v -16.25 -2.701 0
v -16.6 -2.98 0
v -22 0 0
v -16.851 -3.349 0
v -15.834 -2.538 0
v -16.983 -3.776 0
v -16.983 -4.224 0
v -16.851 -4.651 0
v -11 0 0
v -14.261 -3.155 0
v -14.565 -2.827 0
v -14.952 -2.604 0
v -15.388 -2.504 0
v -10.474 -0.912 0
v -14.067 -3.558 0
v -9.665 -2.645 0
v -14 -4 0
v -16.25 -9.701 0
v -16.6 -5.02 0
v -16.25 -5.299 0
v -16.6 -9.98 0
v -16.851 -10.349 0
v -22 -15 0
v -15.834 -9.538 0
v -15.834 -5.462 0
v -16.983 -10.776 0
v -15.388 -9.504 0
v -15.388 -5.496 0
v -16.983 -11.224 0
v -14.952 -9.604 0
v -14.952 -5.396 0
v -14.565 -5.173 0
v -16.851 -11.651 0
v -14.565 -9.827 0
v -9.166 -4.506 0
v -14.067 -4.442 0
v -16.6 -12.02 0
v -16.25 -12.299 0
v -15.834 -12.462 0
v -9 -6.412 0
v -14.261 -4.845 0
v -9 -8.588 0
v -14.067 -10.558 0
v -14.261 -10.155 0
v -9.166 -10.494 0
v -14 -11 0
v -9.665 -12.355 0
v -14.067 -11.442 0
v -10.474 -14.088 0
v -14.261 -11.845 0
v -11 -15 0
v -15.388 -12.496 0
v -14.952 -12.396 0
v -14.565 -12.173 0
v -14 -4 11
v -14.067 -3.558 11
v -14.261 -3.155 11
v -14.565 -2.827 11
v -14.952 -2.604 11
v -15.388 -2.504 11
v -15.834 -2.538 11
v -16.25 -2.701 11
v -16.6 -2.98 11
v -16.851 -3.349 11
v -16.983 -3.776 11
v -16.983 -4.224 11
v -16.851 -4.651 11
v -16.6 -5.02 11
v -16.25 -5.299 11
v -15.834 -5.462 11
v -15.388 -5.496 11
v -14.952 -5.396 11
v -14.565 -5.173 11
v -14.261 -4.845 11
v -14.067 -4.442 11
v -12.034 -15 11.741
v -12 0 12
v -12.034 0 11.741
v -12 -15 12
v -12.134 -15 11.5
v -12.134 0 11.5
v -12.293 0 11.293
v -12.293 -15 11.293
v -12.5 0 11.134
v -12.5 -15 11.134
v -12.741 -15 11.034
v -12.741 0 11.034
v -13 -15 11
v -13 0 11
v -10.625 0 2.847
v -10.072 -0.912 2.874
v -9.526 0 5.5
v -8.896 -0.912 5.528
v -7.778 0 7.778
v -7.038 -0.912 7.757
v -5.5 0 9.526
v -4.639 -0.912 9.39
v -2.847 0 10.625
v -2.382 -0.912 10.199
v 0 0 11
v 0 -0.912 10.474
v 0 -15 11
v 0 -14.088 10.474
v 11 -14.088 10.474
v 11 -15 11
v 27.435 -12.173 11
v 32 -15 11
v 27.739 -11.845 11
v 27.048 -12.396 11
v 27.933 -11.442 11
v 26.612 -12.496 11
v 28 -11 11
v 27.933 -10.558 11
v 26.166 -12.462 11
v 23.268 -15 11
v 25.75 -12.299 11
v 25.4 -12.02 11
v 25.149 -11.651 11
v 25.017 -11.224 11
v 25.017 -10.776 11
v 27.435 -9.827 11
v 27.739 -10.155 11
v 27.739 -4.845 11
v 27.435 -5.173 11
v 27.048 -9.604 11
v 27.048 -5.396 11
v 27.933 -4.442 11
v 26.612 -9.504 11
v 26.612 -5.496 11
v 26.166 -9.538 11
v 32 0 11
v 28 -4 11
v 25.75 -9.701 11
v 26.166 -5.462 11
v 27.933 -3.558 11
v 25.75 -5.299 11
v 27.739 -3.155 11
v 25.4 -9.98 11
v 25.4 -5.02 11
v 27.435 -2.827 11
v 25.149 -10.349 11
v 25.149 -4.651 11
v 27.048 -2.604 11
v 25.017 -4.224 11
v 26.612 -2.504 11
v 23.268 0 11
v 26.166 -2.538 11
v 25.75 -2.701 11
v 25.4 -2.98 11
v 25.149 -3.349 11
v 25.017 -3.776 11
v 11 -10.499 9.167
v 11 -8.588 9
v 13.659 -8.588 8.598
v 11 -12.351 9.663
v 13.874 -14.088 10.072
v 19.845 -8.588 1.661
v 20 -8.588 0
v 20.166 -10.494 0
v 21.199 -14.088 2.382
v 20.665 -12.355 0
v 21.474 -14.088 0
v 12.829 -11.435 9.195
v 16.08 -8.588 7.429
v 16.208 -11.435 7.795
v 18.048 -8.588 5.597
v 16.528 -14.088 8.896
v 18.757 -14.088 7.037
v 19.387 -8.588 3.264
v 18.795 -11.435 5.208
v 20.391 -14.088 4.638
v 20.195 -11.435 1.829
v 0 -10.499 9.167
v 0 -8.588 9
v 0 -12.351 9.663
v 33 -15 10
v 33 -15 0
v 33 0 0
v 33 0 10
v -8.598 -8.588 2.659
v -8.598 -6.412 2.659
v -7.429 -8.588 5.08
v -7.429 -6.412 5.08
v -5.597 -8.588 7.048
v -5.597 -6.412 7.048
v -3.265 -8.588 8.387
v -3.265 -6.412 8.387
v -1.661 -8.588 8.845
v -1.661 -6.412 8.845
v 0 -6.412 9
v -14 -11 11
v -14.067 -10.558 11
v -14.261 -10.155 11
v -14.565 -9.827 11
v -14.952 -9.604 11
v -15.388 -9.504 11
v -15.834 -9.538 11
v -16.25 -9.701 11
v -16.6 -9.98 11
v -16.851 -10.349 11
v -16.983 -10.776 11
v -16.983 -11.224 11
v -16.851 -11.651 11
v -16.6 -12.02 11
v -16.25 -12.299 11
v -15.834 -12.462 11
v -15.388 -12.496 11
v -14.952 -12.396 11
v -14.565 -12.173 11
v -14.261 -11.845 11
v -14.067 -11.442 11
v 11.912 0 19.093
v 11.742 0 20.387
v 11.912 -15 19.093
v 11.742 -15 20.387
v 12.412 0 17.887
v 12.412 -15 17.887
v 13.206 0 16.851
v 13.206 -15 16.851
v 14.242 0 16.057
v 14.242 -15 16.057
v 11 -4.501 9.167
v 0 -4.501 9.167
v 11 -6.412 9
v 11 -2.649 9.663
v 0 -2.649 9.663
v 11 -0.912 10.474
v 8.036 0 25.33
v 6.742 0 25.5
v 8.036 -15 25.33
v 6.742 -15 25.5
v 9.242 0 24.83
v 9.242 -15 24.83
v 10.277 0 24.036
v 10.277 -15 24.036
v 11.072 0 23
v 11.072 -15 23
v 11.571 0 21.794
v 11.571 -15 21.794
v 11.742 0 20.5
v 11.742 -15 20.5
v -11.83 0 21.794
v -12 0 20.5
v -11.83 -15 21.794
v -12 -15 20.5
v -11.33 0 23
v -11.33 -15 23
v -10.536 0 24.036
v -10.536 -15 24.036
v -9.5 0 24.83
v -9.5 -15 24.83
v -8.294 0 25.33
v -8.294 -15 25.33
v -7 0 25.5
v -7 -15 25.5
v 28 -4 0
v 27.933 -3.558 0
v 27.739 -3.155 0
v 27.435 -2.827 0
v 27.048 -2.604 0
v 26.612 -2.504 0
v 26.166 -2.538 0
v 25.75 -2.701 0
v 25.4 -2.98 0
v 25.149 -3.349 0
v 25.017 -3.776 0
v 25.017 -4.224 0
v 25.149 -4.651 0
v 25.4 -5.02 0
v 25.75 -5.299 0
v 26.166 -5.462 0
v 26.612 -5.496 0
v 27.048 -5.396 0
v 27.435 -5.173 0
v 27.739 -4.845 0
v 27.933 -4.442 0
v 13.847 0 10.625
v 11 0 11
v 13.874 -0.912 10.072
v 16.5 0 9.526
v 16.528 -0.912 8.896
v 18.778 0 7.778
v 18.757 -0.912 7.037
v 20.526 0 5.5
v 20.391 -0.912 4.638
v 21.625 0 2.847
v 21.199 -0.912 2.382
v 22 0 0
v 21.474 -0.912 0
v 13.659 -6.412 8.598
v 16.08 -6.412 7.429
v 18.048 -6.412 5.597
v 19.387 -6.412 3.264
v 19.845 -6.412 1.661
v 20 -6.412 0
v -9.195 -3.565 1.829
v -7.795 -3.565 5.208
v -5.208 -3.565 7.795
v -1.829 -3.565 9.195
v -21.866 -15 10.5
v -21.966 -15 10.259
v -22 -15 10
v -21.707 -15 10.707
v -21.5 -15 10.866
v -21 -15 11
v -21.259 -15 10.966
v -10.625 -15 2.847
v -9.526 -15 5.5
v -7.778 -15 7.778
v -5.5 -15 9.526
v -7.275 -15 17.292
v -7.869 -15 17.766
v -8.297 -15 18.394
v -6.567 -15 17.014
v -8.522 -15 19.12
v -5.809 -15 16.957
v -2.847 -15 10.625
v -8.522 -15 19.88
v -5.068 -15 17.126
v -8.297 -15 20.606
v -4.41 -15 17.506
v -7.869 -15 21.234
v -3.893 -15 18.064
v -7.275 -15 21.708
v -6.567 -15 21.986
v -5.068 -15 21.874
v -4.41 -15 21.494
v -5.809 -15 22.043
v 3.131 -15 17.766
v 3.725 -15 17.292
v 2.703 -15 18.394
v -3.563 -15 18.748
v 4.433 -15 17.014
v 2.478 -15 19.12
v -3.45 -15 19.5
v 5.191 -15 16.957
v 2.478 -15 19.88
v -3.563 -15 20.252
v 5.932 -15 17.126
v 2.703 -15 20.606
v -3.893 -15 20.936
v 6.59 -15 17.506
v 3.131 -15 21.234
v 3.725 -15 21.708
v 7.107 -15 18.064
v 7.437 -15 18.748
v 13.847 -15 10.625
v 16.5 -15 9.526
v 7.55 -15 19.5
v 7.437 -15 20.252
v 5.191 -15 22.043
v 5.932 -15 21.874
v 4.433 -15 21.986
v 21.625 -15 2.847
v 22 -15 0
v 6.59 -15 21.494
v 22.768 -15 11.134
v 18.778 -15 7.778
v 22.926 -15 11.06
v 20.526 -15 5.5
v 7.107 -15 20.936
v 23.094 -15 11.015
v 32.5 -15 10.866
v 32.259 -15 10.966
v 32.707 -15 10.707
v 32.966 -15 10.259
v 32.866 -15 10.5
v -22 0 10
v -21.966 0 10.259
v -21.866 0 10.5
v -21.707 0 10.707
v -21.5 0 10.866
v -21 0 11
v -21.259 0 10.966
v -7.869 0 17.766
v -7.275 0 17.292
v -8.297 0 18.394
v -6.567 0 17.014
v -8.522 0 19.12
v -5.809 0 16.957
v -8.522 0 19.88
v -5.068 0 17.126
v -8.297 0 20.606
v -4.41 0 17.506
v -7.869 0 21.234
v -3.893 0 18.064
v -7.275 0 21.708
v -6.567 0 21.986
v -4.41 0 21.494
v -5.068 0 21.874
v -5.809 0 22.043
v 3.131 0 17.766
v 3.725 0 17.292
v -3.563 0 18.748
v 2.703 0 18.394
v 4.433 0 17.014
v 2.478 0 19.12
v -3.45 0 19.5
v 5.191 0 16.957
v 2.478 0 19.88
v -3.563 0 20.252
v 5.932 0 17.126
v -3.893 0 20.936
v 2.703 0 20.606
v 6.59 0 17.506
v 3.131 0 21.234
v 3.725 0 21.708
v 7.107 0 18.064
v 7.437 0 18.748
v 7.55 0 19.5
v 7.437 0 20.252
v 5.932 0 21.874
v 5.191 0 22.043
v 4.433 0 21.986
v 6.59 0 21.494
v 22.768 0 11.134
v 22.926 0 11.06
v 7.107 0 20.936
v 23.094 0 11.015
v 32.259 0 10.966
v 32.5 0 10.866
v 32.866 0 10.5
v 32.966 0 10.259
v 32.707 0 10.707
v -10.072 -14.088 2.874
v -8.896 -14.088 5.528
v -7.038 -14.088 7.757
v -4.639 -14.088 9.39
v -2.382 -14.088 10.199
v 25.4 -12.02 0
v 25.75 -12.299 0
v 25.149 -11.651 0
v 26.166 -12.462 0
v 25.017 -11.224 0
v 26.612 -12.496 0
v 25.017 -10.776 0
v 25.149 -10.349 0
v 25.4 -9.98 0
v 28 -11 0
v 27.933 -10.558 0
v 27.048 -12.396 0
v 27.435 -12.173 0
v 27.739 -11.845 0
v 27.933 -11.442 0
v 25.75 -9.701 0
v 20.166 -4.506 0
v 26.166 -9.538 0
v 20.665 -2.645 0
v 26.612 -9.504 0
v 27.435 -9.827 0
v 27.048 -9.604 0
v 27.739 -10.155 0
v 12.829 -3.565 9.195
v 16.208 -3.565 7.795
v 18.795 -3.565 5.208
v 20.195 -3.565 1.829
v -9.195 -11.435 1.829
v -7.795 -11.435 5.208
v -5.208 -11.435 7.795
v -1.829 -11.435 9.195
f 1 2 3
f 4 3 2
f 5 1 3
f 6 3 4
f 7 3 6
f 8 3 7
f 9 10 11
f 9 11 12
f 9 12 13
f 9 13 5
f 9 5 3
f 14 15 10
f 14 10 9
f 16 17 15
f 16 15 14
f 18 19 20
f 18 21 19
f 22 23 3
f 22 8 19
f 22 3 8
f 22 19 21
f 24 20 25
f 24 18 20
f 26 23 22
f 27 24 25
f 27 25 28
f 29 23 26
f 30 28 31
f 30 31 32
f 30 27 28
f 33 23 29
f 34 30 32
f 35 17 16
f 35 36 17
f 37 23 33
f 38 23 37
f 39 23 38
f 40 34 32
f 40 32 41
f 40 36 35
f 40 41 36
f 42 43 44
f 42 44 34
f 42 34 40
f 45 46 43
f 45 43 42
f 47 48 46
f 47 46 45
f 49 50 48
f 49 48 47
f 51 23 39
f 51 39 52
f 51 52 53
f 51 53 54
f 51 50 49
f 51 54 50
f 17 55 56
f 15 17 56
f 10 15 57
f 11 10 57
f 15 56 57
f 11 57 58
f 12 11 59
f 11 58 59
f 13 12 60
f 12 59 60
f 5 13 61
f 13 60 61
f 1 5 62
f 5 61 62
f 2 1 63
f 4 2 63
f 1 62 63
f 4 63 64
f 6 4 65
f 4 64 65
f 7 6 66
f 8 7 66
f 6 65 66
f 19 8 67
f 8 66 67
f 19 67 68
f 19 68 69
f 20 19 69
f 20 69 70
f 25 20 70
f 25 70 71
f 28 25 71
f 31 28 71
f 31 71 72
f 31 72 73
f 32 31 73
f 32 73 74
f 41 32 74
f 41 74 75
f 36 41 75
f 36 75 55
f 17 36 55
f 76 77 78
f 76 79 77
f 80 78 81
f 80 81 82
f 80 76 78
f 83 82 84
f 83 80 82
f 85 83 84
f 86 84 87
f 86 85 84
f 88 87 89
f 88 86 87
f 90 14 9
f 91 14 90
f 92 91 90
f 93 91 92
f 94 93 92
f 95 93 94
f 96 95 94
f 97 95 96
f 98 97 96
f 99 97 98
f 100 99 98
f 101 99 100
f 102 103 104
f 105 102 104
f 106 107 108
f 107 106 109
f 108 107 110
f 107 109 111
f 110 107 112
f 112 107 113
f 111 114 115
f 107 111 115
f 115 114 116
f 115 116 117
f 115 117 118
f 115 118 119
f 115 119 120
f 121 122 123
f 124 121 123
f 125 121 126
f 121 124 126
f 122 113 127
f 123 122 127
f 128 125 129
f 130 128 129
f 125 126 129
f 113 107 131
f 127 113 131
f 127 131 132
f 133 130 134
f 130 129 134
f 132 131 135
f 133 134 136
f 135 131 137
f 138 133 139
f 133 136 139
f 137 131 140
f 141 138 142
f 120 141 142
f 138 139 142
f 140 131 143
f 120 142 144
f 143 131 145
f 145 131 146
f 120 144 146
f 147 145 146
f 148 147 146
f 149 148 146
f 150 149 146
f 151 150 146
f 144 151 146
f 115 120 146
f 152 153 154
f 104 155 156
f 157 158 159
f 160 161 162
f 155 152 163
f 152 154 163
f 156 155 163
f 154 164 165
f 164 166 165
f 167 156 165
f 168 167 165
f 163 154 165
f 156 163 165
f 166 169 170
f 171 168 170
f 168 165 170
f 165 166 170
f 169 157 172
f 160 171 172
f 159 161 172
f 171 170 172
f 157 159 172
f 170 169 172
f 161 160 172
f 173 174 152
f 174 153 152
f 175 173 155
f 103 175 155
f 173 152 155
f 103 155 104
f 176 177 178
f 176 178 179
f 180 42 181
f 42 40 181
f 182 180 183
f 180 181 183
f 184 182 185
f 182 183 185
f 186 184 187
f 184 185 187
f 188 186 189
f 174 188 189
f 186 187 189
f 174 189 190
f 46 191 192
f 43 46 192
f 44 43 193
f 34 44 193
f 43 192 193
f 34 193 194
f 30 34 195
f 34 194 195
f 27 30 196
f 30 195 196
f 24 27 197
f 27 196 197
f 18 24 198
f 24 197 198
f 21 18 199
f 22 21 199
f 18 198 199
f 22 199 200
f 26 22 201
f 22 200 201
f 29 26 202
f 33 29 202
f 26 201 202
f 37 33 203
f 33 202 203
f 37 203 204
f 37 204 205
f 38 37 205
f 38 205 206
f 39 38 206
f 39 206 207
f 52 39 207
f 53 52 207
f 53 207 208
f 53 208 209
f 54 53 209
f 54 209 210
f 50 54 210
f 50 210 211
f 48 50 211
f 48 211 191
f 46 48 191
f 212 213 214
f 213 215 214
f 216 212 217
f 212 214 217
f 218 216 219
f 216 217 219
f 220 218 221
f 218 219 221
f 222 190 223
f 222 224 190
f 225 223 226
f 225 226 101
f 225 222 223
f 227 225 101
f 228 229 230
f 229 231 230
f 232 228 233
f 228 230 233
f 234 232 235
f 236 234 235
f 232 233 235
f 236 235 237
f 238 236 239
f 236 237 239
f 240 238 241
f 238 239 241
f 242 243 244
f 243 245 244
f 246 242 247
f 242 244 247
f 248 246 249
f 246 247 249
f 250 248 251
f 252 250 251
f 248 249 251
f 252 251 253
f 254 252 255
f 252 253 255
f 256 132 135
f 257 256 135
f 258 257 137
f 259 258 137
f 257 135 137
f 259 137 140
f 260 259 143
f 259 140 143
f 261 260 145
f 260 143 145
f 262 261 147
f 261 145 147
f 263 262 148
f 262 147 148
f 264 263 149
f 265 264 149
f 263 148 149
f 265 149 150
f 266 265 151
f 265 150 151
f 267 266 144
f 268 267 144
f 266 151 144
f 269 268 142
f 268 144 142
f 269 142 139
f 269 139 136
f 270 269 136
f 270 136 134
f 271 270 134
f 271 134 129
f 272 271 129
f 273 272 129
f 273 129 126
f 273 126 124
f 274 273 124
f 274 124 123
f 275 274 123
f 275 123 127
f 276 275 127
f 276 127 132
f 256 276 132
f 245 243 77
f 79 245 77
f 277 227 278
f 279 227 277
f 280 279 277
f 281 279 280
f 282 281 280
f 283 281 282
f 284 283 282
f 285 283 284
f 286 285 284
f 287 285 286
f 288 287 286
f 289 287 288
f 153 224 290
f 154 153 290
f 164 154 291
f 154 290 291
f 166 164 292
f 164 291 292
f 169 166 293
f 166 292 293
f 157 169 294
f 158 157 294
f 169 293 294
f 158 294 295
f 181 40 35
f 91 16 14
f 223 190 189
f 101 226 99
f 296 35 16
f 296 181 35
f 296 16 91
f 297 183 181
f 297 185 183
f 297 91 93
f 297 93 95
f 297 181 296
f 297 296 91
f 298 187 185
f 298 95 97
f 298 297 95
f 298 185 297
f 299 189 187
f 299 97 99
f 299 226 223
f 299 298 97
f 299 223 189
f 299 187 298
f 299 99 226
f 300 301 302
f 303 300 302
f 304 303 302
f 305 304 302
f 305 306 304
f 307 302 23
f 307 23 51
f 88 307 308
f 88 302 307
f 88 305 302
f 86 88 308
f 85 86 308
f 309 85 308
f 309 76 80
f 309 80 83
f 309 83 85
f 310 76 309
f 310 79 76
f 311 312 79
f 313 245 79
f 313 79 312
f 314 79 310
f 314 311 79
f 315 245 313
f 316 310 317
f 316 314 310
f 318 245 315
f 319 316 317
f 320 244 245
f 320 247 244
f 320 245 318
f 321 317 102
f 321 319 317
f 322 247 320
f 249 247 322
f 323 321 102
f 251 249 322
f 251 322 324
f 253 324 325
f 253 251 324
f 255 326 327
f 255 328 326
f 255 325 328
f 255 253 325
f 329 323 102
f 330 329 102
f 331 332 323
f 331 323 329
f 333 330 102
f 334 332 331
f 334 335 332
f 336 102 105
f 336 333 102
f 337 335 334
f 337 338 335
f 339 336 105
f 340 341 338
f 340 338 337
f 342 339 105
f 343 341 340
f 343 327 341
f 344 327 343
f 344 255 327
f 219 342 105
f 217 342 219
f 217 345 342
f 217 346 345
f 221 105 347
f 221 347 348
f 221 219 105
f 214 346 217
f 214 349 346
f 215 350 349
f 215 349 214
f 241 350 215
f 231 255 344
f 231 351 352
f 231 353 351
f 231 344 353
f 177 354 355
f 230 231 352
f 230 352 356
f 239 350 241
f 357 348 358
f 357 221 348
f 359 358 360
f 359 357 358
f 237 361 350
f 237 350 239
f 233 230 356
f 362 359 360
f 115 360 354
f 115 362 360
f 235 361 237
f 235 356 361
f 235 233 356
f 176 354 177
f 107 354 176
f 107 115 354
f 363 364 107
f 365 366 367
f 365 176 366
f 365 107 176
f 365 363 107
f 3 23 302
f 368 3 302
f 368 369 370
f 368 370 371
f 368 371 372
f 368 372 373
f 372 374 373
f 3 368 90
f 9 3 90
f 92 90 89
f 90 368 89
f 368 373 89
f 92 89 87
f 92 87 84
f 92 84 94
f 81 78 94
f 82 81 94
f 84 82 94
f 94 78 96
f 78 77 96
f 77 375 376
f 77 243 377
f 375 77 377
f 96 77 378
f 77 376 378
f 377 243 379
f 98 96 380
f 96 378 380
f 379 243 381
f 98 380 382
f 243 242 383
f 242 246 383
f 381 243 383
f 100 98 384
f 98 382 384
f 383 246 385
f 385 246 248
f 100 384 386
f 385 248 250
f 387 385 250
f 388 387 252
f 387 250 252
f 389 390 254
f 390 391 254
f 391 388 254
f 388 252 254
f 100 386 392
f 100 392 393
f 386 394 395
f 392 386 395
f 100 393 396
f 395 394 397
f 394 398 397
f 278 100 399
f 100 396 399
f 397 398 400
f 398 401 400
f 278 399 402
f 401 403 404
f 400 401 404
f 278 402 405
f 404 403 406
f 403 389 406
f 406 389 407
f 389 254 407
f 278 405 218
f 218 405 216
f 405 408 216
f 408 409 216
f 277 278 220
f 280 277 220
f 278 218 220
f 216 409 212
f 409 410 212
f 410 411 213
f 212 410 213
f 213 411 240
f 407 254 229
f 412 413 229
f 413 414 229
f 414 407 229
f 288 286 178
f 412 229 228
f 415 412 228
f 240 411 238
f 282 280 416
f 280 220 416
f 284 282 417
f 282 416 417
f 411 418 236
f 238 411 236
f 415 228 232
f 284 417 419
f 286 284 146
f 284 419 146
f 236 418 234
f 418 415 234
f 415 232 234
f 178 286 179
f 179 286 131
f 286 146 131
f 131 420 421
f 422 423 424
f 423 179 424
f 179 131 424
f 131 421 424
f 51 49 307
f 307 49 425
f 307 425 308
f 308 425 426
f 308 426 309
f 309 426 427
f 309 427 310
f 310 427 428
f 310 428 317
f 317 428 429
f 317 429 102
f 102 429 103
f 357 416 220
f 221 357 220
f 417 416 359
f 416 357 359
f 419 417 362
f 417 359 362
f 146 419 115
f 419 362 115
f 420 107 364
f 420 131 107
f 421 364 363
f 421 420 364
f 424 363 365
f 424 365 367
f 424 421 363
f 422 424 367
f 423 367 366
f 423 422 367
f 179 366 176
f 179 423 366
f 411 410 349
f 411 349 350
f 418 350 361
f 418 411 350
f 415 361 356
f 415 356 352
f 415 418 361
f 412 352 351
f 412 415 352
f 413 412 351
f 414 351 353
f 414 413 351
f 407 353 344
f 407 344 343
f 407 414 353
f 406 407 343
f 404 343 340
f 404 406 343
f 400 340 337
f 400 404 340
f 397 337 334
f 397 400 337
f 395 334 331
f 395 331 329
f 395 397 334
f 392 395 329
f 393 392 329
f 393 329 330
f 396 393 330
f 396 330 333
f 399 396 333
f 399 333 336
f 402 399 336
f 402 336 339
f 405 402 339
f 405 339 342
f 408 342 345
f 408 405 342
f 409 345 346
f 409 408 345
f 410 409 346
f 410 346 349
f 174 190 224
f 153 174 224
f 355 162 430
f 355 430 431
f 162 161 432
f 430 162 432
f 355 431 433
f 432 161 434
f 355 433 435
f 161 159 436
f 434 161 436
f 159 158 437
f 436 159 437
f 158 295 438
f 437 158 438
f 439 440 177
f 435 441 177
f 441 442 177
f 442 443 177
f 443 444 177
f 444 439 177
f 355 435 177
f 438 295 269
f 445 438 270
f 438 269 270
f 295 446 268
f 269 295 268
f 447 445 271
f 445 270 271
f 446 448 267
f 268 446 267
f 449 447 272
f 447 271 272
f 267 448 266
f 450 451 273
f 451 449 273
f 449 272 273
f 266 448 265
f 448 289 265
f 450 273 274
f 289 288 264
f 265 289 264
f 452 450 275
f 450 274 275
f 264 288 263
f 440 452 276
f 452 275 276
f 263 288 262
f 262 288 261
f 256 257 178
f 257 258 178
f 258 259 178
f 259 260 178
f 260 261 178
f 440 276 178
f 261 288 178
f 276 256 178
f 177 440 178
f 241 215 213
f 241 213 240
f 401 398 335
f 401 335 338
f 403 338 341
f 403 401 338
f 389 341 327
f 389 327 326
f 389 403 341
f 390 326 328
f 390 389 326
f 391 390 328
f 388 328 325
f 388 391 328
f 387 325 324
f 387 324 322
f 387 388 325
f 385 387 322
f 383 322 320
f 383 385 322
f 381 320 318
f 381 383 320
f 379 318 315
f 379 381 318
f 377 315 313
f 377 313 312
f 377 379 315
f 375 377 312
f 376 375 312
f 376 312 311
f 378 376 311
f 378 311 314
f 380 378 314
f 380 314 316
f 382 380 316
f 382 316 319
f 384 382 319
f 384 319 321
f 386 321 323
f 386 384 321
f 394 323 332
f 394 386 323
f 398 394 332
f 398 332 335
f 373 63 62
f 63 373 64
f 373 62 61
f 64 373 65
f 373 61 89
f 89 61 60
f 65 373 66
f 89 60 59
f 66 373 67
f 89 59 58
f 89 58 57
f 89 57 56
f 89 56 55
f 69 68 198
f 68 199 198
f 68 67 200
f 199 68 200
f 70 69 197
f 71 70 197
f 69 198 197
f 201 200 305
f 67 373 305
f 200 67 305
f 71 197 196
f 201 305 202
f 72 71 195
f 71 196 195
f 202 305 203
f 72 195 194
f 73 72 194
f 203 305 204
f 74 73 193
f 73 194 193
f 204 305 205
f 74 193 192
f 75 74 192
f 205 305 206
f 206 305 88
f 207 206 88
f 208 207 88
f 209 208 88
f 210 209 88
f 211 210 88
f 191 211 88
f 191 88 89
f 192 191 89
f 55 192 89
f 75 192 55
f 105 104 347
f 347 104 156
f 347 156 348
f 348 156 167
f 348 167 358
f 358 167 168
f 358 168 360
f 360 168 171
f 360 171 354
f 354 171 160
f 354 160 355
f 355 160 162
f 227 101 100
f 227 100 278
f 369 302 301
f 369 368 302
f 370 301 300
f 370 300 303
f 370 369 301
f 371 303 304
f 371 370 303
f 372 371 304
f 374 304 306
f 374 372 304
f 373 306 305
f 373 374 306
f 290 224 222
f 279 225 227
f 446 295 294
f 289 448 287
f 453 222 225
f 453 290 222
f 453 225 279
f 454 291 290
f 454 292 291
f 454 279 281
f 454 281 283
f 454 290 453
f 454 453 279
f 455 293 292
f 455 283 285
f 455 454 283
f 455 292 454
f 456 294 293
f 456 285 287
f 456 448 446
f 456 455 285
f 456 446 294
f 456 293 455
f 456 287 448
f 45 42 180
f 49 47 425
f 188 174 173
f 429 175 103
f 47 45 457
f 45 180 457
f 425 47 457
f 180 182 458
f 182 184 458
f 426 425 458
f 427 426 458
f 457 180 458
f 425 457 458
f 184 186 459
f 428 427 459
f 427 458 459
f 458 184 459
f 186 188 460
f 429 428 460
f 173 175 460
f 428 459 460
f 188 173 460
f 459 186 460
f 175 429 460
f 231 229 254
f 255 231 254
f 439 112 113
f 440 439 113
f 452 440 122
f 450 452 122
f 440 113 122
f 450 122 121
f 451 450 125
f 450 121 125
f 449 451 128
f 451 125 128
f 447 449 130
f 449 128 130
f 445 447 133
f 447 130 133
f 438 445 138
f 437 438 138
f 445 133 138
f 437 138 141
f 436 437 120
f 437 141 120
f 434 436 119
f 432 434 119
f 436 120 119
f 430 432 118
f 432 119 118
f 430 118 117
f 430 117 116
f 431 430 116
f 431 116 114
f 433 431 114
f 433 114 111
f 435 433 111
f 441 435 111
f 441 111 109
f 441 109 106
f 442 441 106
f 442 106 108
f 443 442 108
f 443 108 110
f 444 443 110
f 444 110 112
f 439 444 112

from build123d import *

# Parameters (mm, degrees)
F0_R       = 2.55
F1_DEPTH   = 15
F2_R       = 4.99999
F3_R       = 1.5
F4_DEPTH   = 25
F5_R       = 1.5
F6_DEPTH   = 25
F7_SIZE2   = 3.4641016151
F7_SIZE    = 2
F7_2_SIZE2 = 3.4641016151
F7_2_SIZE  = 2
F8_R       = 11
F9_R       = 1
F10_W      = 76.274741441
F10_H      = 34.1036086902
F11_DEPTH  = 25
F12_W      = 2
F12_H      = 11
F13_DEPTH  = 15
F14_R      = 1


# Not quite as in the source:
# - a fillet or chamfer is up to 0.001 mm smaller than in the source, because OpenCascade refuses the exact size


with BuildPart() as f1:
    # F0 (on Front) → F1 (new body)
    with BuildSketch(Plane.XZ):
        Polygon((-20, 11), (-20, 0), (-20, -10), (-12, -10), (-12, -15), (23, -15), (23, -10), (31, -10), (31, 11), (23, 11), (11.7416697508, 17.5), (11.7416697508, 25.5), (-12, 25.5), (-12, 11), align=None)
        with BuildLine():
            ThreePointArc((0, -9), (-9, 0), (0, 9))
            Line((0, 9), (11, 9))
            ThreePointArc((11, 9), (20, 0), (11, -9))
            Line((11, -9), (0, -9))
        make_face(mode=Mode.SUBTRACT)
        with Locations((-6, 19.5)):
            Circle(F0_R, mode=Mode.SUBTRACT)
        with Locations((5, 19.5)):
            Circle(F0_R, mode=Mode.SUBTRACT)
    extrude(amount=F1_DEPTH)

    # F2 (radius 5 in the source; OpenCascade refuses exactly that, so slightly less here)
    f2_edges = [f1.edges().sort_by_distance(p)[0] for p in [
        (11.74167, -7.5, 25.5),
        (-12, -7.5, 25.5),
        (-12, -7.5, -15),
        (23, -7.5, -15),
        (11.74167, -7.5, 17.5),
    ]]
    fillet(f2_edges, radius=F2_R)

    # F3 (on face) → F4 (cut)
    with BuildSketch(Plane.XY.offset(11)):
        with Locations((-15.5, -4)):
            Circle(F3_R)
        with Locations((-15.5, -11)):
            Circle(F3_R)
    extrude(amount=-F4_DEPTH, mode=Mode.SUBTRACT)

    # F5 (on face) → F6 (cut)
    with BuildSketch(Plane.XY.offset(11)):
        with Locations((26.5, -4)):
            Circle(F5_R)
        with Locations((26.5, -11)):
            Circle(F5_R)
    extrude(amount=-F6_DEPTH, mode=Mode.SUBTRACT)

    # F7
    f7_edges = [f1.edges().sort_by_distance(p)[0] for p in [
        (-9, 0, 0),
        (5.5, 0, 9),
    ]]
    f7_side = f1.faces().sort_by_distance((11.090421, 0, 20.443378))[0]
    chamfer(f7_edges, length=F7_SIZE, length2=F7_SIZE2, reference=f7_side)

    # F7#2
    f7_2_edges = [f1.edges().sort_by_distance(p)[0] for p in [
        (5.5, -15, 9),
    ]]
    f7_2_side = f1.faces().sort_by_distance((11.090421, -15, 20.443378))[0]
    chamfer(f7_2_edges, length=F7_2_SIZE, length2=F7_2_SIZE2, reference=f7_2_side)

    # F8
    f8_edges = [f1.edges().sort_by_distance(p)[0] for p in [
        (-9, -11.535898, 0),
        (-9, -3.464102, 0),
        (5.5, -11.535898, 9),
        (5.5, -3.464102, 9),
    ]]
    fillet(f8_edges, radius=F8_R)

    # F9
    f9_edges = [f1.edges().sort_by_distance(p)[0] for p in [
        (-12, -7.5, 11),
        (23, -7.5, 11),
    ]]
    fillet(f9_edges, radius=F9_R)

    # F10 (on Top) → F11 (cut)
    with BuildSketch(Plane.XY):
        with Locations((3.48370336, -7.8841676004)):
            Rectangle(F10_W, F10_H)
    extrude(amount=-F11_DEPTH, mode=Mode.SUBTRACT)

    # F12 (on face) → F13 (join)
    with BuildSketch(Plane.XZ.offset(15)):
        with Locations((-21, 5.5)):
            Rectangle(F12_W, F12_H)
        with Locations((32, 5.5)):
            Rectangle(F12_W, F12_H)
    extrude(amount=-F13_DEPTH)

    # F14
    f14_edges = [f1.edges().sort_by_distance(p)[0] for p in [
        (-22, -7.5, 11),
        (33, -7.5, 11),
    ]]
    fillet(f14_edges, radius=F14_R)


solid = f1.part
